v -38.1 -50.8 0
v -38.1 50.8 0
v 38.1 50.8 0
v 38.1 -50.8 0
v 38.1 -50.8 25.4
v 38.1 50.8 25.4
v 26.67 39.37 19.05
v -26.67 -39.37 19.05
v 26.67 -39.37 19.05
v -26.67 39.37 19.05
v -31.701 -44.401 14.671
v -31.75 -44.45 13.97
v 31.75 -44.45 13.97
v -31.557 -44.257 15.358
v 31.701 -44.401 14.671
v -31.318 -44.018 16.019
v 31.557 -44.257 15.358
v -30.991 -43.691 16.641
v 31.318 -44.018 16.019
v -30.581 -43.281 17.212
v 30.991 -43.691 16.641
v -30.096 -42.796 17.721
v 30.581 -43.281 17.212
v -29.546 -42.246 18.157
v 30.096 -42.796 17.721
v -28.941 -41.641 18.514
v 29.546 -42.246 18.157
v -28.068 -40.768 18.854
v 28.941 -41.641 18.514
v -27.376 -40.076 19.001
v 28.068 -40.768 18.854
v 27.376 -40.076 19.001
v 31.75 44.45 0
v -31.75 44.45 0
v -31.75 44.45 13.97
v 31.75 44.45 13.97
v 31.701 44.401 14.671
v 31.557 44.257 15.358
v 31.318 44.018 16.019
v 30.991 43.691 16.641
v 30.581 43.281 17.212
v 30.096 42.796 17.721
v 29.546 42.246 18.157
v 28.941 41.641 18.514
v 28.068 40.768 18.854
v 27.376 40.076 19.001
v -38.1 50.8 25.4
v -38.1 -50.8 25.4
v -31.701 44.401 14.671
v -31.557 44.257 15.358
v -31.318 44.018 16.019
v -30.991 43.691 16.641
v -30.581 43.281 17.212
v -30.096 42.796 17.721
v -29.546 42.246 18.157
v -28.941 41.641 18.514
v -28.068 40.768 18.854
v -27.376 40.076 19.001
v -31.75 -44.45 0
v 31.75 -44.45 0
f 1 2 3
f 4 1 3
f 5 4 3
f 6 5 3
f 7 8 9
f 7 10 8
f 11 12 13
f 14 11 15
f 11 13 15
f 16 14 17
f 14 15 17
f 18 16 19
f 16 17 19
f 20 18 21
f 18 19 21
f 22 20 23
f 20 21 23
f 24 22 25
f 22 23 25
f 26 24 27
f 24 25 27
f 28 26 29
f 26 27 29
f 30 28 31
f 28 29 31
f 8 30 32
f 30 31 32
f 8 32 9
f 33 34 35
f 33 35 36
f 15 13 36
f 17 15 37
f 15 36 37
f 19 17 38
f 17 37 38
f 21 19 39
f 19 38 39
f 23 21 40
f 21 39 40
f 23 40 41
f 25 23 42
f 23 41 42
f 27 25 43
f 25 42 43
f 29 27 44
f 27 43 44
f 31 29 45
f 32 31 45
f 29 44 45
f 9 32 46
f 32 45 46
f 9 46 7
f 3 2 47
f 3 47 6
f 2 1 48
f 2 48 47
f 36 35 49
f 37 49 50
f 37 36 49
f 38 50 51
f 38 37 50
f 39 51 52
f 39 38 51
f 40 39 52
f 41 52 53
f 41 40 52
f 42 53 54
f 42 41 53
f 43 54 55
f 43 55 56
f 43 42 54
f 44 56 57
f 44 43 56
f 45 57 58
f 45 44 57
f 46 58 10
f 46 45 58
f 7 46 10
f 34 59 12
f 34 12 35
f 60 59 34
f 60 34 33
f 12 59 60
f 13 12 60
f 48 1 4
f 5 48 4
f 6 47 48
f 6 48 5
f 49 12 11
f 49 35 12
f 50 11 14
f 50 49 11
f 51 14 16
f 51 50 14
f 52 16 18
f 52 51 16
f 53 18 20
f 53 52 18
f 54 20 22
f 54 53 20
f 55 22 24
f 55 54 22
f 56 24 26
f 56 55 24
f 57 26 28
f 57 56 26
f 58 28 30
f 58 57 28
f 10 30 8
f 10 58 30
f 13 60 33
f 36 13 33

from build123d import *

# Parameters (mm, degrees)
F0_W     = 76.2
F0_H     = 101.6
F2_DEPTH = 25.4
F1_W     = 63.5
F1_H     = 88.9
F3_DEPTH = 19.05
F4_R     = 5.08


with BuildPart() as f2:
    # F0 (on Top) → F2 (new body)
    with BuildSketch(Plane.XY):
        Rectangle(F0_W, F0_H)
    extrude(amount=F2_DEPTH)


with BuildPart() as f3:
    # F1 (on Top) → F3 (new body)
    with BuildSketch(Plane.XY):
        Rectangle(F1_W, F1_H)
    extrude(amount=F3_DEPTH)

    # F4
    f4_edges = [f3.edges().sort_by_distance(p)[0] for p in [
        (0, -44.45, 19.05),
        (31.75, 0, 19.05),
        (0, 44.45, 19.05),
        (-31.75, 0, 19.05),
    ]]
    fillet(f4_edges, radius=F4_R)


solid = Compound([f2.part, f3.part])
